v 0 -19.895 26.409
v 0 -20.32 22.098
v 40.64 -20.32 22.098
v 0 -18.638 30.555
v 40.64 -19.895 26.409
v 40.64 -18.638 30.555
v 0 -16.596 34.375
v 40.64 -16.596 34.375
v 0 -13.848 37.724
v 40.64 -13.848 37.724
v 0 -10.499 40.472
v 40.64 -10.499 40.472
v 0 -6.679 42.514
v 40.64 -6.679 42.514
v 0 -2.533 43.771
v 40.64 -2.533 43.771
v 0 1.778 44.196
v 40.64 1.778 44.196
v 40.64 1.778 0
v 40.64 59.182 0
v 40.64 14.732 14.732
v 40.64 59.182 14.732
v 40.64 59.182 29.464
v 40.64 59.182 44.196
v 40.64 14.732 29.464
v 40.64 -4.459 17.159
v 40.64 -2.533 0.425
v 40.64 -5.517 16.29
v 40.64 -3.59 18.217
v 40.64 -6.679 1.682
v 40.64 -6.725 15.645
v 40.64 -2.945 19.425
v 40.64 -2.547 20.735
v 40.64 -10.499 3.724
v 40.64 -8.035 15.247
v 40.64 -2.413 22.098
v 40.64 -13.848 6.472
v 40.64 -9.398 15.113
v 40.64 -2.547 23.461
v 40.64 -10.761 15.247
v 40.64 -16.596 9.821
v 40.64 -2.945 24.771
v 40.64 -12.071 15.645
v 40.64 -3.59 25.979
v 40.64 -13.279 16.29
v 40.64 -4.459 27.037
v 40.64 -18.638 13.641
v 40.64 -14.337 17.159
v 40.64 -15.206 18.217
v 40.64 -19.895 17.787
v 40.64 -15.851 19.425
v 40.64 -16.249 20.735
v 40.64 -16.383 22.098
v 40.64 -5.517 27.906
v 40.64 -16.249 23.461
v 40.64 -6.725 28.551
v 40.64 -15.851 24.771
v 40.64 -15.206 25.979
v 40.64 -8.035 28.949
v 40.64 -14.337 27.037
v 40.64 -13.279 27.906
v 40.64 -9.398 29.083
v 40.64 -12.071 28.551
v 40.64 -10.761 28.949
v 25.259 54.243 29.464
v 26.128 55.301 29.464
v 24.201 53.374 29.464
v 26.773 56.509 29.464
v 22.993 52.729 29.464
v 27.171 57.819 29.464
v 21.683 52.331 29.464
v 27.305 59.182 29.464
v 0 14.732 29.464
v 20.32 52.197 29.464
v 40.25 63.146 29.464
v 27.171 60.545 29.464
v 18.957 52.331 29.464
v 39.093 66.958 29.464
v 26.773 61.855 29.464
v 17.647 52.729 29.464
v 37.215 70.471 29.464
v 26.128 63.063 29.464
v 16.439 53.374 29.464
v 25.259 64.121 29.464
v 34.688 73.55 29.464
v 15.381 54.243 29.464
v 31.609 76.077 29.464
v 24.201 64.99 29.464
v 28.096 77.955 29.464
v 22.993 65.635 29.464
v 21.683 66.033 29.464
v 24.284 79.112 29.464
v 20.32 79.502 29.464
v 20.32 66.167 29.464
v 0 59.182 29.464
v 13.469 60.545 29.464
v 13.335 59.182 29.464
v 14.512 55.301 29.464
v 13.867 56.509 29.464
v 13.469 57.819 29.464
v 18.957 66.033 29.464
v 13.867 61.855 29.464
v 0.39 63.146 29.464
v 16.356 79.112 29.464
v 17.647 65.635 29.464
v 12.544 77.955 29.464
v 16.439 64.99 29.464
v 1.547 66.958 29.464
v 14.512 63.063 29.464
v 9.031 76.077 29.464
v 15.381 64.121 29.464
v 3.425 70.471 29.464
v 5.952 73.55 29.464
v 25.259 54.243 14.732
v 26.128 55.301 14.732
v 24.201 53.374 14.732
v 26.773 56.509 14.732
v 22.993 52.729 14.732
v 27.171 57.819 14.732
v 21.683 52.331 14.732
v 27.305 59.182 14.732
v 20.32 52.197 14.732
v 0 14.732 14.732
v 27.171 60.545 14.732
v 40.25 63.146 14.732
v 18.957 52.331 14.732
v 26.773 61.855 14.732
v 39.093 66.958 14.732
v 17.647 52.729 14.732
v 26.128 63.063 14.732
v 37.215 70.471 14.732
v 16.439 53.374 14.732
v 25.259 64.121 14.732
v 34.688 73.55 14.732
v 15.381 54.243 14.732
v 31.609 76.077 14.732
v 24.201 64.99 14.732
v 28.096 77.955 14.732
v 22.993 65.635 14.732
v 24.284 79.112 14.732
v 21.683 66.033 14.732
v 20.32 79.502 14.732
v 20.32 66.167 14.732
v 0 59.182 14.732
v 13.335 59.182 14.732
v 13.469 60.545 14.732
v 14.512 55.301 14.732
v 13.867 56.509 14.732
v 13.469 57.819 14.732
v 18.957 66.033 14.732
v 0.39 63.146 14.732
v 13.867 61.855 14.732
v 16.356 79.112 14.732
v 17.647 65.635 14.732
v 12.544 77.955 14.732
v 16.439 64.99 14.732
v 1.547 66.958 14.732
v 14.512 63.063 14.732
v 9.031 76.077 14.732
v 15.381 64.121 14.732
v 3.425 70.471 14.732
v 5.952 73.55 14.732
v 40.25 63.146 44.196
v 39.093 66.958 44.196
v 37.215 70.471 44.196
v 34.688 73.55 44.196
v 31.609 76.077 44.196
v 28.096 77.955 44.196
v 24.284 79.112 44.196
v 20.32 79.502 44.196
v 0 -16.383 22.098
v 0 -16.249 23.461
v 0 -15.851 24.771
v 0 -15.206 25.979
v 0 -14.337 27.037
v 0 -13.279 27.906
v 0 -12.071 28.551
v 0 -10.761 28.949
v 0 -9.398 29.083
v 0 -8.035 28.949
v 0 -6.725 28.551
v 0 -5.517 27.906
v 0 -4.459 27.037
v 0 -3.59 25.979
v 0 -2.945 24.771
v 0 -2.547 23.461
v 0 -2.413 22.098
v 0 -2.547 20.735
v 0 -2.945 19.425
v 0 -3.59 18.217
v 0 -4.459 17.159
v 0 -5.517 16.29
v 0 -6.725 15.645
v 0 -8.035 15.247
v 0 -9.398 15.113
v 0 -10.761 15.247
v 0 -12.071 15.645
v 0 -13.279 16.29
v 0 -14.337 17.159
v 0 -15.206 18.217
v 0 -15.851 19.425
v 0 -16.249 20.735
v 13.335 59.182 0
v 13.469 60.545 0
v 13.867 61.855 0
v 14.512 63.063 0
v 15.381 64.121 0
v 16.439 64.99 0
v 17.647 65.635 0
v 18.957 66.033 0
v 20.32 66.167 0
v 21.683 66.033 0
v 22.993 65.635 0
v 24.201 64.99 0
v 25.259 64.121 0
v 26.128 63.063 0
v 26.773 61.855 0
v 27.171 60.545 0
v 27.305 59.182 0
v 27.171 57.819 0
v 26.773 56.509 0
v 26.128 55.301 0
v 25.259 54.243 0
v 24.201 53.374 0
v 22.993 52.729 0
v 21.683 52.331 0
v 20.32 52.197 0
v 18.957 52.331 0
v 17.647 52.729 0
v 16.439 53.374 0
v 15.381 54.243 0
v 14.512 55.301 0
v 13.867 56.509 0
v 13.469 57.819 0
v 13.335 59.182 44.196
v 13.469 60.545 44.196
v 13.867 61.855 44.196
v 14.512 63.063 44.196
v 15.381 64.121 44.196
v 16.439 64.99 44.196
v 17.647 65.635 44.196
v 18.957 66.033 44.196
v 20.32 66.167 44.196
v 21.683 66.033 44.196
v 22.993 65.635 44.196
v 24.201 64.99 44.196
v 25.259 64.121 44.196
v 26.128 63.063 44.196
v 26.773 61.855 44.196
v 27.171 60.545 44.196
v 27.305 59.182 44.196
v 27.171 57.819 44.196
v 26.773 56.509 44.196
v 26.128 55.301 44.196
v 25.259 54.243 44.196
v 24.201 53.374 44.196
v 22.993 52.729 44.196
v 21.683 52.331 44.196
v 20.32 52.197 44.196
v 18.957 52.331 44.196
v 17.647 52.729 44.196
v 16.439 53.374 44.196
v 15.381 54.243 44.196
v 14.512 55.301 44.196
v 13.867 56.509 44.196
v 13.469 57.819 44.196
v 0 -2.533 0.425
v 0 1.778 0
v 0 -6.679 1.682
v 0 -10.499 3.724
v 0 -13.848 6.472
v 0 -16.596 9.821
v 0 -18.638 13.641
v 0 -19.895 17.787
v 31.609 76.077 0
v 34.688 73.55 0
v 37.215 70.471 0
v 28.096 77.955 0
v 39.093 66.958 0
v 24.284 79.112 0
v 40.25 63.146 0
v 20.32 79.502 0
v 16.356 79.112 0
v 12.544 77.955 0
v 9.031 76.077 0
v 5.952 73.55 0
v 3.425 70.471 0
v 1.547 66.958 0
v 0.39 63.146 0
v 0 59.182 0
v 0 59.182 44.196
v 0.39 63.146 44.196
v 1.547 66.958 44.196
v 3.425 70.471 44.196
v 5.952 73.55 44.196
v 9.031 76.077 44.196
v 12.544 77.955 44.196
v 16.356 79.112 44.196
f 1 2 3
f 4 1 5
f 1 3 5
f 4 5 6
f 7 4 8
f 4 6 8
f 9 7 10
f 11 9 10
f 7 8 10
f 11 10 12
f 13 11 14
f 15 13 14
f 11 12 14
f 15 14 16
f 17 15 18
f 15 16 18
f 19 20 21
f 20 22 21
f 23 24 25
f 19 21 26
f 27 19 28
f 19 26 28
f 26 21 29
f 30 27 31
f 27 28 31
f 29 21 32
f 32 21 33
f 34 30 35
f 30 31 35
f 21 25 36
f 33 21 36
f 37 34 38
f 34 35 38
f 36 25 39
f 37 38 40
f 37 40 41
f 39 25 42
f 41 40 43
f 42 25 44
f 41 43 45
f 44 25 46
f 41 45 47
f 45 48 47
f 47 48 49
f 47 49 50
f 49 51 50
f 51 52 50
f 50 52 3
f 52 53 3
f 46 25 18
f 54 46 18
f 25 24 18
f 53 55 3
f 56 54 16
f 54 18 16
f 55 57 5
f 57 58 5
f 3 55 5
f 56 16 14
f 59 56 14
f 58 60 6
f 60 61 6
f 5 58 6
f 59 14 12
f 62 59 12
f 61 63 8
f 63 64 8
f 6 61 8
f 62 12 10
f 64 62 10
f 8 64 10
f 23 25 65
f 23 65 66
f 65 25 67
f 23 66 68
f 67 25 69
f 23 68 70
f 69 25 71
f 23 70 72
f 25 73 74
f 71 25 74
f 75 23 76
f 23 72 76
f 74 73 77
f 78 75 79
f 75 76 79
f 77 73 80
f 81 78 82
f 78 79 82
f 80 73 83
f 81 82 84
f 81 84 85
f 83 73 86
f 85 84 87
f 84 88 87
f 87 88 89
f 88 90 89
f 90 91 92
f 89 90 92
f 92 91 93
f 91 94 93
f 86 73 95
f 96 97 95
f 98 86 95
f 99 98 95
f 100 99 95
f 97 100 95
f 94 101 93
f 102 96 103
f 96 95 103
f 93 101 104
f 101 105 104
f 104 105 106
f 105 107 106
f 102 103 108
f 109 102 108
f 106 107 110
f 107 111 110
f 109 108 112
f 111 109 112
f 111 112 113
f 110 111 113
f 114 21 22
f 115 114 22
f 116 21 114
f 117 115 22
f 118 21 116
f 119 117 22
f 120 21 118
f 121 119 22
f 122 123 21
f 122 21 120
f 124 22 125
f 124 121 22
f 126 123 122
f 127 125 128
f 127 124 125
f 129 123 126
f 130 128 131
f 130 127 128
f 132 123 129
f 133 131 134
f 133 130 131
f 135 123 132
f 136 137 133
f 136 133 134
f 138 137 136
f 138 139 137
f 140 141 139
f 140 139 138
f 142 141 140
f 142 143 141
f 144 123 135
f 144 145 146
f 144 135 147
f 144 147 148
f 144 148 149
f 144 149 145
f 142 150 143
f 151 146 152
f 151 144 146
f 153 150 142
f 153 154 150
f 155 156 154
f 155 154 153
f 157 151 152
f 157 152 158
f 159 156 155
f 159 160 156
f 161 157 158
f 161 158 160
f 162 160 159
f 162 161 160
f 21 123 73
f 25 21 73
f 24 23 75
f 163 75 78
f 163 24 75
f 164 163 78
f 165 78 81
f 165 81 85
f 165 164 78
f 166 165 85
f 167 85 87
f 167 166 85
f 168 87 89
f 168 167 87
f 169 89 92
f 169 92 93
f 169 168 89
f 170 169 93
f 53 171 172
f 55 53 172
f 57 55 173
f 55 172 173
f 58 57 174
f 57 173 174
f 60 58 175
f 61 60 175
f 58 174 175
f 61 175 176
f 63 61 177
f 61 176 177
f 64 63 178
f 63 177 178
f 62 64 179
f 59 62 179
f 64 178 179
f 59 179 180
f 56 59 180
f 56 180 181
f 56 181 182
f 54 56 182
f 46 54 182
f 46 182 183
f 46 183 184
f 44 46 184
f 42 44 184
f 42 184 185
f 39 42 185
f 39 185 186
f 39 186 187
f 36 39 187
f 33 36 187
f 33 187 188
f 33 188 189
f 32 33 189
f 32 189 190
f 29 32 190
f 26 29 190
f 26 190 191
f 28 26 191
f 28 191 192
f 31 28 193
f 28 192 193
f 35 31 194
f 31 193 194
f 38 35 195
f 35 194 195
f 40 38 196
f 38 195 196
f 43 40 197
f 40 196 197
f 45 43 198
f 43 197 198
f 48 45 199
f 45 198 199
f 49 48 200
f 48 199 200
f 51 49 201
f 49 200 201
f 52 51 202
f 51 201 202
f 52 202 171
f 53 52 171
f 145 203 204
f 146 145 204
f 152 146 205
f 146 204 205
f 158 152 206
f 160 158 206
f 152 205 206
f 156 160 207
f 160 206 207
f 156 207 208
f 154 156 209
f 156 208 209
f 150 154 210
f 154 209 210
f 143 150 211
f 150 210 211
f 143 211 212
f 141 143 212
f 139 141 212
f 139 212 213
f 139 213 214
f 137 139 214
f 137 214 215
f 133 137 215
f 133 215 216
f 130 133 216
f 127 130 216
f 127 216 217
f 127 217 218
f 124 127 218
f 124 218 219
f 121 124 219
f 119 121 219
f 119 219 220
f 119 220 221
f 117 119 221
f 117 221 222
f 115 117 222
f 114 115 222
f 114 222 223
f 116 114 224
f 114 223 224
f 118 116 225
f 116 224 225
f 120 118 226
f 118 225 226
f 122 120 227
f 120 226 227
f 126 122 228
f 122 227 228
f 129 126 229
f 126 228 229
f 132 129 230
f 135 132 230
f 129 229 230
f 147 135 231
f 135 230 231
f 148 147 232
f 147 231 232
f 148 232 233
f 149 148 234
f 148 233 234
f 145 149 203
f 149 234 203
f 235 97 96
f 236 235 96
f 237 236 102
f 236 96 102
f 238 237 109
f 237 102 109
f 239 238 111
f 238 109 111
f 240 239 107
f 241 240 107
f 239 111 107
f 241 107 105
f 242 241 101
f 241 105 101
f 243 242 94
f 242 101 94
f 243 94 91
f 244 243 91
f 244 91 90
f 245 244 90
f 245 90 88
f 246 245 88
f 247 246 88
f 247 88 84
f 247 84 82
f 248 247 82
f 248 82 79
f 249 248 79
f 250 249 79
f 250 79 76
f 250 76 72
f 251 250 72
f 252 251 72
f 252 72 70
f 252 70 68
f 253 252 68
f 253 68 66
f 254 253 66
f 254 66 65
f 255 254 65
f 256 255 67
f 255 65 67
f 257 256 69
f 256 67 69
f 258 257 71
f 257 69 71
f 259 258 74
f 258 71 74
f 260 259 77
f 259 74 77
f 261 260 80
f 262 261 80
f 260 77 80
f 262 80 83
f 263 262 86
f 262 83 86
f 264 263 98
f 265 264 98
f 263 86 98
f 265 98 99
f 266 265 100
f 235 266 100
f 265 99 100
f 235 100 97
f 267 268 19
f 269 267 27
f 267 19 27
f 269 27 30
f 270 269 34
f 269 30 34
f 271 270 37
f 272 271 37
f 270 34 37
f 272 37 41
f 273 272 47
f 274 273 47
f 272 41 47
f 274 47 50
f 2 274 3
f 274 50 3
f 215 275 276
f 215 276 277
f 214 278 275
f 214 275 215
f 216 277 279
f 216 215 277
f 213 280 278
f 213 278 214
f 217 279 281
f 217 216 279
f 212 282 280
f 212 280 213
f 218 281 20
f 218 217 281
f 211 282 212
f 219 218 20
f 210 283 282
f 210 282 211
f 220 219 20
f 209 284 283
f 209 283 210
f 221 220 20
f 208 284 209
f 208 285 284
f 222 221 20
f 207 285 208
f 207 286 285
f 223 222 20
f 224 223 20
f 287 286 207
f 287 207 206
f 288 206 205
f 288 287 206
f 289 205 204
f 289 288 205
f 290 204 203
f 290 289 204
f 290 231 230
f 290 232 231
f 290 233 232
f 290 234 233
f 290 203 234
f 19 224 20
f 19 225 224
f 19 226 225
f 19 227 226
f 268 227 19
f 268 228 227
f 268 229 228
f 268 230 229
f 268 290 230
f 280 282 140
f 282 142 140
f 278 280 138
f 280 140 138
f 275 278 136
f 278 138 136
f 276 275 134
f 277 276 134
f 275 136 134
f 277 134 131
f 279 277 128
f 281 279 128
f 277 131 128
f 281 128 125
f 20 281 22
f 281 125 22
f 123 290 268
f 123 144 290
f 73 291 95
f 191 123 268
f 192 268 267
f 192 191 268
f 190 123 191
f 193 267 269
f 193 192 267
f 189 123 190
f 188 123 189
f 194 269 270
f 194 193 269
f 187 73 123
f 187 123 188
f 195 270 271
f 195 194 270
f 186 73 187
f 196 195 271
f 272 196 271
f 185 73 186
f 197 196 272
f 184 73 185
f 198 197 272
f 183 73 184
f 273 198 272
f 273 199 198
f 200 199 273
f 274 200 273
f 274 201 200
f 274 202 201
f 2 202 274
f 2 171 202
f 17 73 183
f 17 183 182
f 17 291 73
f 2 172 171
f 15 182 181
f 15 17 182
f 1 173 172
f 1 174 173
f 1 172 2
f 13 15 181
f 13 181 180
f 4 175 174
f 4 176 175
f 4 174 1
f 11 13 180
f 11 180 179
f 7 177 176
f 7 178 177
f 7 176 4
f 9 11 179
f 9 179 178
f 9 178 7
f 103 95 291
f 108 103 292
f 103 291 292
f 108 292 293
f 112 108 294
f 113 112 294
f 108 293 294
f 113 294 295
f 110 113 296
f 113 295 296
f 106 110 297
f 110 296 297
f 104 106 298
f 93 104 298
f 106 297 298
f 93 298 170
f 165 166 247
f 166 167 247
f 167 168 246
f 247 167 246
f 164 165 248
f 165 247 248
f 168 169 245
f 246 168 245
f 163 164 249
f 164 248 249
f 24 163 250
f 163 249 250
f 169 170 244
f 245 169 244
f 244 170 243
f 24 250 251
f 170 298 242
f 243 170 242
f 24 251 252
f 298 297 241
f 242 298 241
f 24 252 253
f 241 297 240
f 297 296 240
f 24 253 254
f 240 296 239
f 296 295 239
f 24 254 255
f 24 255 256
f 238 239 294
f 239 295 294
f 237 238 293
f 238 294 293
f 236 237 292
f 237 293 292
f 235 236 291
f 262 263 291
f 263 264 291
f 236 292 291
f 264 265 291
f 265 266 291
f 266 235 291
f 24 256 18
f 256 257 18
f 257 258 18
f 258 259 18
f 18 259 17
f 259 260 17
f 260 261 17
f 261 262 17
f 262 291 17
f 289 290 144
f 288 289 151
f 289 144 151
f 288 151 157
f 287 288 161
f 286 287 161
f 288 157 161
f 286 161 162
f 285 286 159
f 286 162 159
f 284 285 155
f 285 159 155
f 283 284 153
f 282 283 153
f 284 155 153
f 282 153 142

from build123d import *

# Parameters (mm, degrees)
F0_W     = 79.502
F0_H     = 44.196
F1_DEPTH = 40.64
F3_T     = -14.732
F4_D     = 13.97
F6_W     = 20.32
F6_H     = 44.196
F7_DEPTH = 40.64
F8_D     = 13.97
F9_R     = 22.09799
F10_R    = 20.31999


# Not quite as in the source:
# - a fillet or chamfer is up to 0.001 mm smaller than in the source, because OpenCascade refuses the exact size


with BuildPart() as f1:
    # F0 (on Right) → F1 (new body)
    with BuildSketch(Plane.YZ):
        with Locations((39.751, 22.098)):
            Rectangle(F0_W, F0_H)
    extrude(amount=F1_DEPTH)

    # F3
    f3_openings = [f1.faces().sort_by_distance(p)[0] for p in [
        (40.64, 39.751, 22.098),
        (20.32, 79.502, 22.098),
        (0, 39.751, 22.098),
    ]]
    offset(amount=F3_T, openings=f3_openings)

    # F4 (through all)
    with Locations(Plane.XY.offset(44.196)):
        with Locations((20.32, 59.182)):
            Hole(F4_D / 2)

    # F6 (on face) → F7 (join)
    with BuildSketch(Plane(origin=(0, 0, 0), x_dir=(0, -1, 0), z_dir=(-1, 0, 0))):
        with Locations((10.16, 22.098)):
            Rectangle(F6_W, F6_H)
    extrude(amount=-F7_DEPTH)

    # F8 (through all)
    with Locations(Plane.YZ.offset(40.64)):
        with Locations((-9.398, 22.098)):
            Hole(F8_D / 2)

    # F9 (radius 22.098 in the source; OpenCascade refuses exactly that, so slightly less here)
    f9_edges = [f1.edges().sort_by_distance(p)[0] for p in [
        (20.32, -20.32, 44.196),
        (20.32, -20.32, 0),
    ]]
    fillet(f9_edges, radius=F9_R)

    # F10 (radius 20.32 in the source; OpenCascade refuses exactly that, so slightly less here)
    f10_edges = [f1.edges().sort_by_distance(p)[0] for p in [
        (0, 79.502, 36.83),
        (0, 79.502, 7.366),
        (40.64, 79.502, 7.366),
        (40.64, 79.502, 36.83),
    ]]
    fillet(f10_edges, radius=F10_R)


solid = f1.part
